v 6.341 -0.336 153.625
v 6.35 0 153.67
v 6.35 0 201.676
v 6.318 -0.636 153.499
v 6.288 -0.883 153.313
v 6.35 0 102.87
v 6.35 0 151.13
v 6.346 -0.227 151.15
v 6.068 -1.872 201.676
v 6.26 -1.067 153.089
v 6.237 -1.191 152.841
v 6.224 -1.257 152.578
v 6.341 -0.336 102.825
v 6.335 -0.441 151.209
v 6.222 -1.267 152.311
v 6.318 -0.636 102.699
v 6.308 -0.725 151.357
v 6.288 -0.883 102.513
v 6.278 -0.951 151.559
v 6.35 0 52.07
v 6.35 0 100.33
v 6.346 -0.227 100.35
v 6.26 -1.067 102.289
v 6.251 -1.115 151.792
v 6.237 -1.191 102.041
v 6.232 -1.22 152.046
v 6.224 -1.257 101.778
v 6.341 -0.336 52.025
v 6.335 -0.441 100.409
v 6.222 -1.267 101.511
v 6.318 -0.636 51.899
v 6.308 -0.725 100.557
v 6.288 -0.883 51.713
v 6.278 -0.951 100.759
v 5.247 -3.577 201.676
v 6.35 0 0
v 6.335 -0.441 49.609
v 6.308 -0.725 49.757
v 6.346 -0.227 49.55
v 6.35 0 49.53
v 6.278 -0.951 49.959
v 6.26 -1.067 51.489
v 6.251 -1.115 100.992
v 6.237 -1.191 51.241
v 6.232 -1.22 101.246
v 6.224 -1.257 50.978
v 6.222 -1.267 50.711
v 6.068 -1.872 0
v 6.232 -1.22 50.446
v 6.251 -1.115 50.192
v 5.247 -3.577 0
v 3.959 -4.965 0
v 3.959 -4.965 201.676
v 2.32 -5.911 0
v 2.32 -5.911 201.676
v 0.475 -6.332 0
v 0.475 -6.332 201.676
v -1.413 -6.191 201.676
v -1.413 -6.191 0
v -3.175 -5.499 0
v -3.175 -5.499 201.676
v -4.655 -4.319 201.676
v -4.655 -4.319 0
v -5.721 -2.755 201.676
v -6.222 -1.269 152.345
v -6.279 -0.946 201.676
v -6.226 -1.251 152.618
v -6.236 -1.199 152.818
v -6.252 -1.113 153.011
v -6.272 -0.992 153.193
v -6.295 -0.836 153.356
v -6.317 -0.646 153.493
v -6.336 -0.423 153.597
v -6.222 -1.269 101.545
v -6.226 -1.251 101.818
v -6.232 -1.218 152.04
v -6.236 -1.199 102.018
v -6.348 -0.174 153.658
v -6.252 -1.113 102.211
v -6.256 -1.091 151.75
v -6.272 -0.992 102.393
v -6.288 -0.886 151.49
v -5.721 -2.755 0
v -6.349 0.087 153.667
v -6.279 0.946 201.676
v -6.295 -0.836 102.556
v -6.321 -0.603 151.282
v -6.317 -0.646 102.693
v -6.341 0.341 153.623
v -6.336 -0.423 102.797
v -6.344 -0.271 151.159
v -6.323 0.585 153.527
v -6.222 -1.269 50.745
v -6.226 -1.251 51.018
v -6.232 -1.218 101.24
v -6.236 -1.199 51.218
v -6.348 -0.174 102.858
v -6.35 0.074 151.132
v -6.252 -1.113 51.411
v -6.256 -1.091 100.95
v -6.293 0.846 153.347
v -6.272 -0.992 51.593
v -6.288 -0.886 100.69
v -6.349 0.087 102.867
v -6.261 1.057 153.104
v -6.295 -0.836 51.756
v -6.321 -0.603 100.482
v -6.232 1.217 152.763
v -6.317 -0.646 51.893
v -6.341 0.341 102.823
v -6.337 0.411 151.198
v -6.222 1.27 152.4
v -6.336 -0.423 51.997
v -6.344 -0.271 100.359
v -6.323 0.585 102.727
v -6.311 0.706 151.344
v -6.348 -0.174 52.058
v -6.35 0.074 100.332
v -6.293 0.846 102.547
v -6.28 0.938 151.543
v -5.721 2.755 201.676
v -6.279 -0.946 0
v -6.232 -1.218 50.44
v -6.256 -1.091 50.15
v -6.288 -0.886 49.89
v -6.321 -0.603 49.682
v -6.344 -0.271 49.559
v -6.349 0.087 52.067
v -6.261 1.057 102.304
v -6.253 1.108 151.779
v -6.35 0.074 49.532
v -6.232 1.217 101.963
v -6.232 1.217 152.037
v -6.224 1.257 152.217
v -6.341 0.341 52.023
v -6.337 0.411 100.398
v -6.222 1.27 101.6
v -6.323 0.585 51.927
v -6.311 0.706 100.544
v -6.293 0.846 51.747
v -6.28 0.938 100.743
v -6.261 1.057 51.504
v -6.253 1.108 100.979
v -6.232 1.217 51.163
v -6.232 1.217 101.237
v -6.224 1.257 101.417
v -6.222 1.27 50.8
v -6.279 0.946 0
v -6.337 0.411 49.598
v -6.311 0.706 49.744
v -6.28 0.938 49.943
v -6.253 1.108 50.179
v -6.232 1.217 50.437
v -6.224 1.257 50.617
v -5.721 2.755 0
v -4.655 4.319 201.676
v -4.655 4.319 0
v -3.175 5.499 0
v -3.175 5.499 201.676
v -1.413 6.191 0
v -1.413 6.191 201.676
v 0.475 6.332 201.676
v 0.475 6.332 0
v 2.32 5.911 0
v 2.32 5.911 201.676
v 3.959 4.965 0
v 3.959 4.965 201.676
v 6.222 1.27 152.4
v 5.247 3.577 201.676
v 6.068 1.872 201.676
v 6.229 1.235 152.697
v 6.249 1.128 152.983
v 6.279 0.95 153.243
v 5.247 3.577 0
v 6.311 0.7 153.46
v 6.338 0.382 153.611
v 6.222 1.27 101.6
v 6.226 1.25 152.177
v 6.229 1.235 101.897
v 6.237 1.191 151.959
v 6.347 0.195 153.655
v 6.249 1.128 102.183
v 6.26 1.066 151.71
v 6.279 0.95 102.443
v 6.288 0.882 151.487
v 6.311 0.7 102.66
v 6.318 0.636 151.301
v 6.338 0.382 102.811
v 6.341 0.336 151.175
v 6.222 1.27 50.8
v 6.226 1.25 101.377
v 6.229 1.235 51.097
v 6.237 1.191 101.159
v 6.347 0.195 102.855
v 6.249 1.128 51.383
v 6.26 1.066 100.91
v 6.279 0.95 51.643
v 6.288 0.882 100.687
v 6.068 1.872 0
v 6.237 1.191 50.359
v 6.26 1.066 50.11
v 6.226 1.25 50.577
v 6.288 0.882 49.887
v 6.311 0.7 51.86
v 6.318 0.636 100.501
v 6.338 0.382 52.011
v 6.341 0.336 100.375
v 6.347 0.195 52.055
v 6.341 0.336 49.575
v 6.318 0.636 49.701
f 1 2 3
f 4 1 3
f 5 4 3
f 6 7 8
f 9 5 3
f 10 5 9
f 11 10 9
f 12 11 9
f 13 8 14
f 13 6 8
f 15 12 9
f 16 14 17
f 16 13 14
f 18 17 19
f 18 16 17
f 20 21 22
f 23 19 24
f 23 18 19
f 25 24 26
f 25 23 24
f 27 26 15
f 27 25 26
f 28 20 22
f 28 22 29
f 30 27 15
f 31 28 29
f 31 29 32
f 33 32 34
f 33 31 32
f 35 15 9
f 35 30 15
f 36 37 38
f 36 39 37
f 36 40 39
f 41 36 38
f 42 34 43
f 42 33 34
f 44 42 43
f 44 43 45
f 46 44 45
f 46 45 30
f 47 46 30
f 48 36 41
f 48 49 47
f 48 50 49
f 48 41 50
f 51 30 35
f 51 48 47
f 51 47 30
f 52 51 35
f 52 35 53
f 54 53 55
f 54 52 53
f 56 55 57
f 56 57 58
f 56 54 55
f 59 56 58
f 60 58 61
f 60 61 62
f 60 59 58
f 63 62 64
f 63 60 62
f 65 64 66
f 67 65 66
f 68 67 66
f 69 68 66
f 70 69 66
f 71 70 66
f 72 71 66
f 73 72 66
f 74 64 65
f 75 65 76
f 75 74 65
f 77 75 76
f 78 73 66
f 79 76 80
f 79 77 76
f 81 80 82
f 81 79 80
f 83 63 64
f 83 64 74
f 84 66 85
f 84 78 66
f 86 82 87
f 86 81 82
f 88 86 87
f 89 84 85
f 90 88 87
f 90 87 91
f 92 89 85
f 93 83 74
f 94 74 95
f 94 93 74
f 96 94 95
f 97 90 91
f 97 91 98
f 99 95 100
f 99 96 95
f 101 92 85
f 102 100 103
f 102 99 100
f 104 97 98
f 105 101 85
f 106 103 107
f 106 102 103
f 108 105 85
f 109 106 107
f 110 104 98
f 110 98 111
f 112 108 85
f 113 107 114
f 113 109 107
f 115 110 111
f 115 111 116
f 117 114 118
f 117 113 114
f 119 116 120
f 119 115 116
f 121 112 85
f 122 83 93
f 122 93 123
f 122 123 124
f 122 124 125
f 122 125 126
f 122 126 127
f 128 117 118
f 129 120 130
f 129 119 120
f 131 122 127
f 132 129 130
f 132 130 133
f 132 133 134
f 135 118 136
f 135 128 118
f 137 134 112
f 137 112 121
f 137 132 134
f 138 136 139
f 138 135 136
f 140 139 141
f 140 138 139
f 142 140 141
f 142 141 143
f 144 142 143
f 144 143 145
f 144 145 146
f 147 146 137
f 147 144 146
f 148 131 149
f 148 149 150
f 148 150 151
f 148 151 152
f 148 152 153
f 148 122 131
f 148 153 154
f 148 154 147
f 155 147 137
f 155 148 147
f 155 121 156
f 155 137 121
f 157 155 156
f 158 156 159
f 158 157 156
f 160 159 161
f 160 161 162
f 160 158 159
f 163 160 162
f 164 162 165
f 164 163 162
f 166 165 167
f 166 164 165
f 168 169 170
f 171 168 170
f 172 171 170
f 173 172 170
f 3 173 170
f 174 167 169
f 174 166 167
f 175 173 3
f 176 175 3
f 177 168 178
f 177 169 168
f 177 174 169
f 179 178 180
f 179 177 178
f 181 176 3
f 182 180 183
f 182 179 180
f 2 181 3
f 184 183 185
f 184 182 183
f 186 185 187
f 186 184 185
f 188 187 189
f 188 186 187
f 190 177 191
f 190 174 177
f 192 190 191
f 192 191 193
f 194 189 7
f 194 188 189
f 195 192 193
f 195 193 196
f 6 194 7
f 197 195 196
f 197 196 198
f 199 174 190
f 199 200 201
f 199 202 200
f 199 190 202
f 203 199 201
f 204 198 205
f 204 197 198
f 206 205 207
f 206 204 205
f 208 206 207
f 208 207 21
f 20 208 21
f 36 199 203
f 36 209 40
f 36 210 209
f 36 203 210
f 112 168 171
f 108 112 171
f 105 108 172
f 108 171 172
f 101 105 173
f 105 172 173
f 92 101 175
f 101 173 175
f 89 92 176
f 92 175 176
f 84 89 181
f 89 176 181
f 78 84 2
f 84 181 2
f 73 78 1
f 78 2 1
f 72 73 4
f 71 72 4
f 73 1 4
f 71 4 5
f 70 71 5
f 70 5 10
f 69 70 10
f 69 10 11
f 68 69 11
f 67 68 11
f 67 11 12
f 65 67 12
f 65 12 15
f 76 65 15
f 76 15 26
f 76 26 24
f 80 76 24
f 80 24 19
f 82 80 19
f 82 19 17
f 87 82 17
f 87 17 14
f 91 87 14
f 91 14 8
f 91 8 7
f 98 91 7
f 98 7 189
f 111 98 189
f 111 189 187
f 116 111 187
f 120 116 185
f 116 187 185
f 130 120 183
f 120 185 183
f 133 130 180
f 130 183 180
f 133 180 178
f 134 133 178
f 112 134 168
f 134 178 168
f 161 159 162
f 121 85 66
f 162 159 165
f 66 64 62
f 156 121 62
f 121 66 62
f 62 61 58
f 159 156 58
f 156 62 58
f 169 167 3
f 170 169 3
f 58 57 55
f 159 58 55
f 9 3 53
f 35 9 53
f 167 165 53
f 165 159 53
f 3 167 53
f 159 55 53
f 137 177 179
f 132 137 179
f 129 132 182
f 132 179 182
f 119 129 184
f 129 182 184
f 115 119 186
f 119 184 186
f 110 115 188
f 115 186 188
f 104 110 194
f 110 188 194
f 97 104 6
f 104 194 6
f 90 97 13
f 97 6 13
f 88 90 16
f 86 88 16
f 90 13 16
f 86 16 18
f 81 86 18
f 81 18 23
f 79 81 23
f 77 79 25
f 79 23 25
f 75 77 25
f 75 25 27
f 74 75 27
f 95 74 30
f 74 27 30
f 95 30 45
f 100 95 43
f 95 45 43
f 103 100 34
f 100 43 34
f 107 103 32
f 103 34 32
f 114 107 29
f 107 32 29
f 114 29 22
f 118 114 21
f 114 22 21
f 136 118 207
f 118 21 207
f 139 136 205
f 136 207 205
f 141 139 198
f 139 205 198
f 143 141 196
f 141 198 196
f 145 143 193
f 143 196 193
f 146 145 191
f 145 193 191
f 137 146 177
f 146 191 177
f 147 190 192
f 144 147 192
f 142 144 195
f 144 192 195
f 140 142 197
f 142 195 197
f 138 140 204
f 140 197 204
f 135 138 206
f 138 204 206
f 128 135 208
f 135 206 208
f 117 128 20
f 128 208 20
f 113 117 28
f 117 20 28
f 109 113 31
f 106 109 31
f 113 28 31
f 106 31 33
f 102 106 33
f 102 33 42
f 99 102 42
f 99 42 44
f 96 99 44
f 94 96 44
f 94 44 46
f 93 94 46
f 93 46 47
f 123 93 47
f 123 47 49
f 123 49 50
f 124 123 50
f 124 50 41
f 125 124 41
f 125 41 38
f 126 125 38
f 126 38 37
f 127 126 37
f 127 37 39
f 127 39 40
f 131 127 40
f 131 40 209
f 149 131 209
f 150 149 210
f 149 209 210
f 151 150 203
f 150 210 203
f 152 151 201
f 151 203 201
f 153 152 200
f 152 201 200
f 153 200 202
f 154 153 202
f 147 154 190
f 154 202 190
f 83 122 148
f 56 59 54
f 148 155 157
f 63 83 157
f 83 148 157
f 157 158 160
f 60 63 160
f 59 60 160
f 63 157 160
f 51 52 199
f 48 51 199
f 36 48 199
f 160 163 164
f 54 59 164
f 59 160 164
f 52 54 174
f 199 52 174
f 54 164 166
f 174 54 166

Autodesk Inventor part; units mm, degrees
ref_plane "YZ Plane" through (0, 0, 0) normal (1, 0, 0) x (0, 1, 0)
ref_plane "XZ Plane" through (0, 0, 0) normal (0, 1, 0) x (-1, 0, 0)
ref_plane "XY Plane" through (0, 0, 0) normal (0, 0, 1) x (1, 0, 0)
sketch "Sketch1" plane through (0, 0, 0) normal (0, 0, 1) x (1, 0, 0)
  circle A0 centre (0, 0) radius 6.35
  dimension "d0" = 12.7
extrude "Extrusion1" add sketch "Sketch1" along normal blind 203.2
sketch "Sketch5" plane through (0, 0, 0) normal (0, 1, 0) x (-1, 0, 0)
  line L0 (0, 1.524) -> (-1.27, 1.524)
  line L1 (-6.35, 0) -> (6.35, 0) projected
  line L2 (-1.27, 0) -> (1.27, 0)
  line L3 (1.27, 1.524) -> (0, 1.524)
  line L4 (1.27, 1.524) -> (6.35, 1.524)
  line L5 (6.35, 0) -> (6.35, 203.2) projected
  line L6 (6.35, 1.524) -> (-6.35, 1.524)
  line L7 (-6.35, 1.524) -> (-6.35, 0)
  line L8 (-6.35, 0) -> (6.35, 0)
  line L9 (6.35, 0) -> (6.35, 1.524)
  line L10 (6.35, 203.2) -> (-6.35, 203.2) projected
  line L11 (-6.35, 203.2) -> (6.35, 203.2)
  line L12 (6.35, 203.2) -> (6.35, 201.676)
  line L13 (6.35, 201.676) -> (-6.35, 201.676)
  line L14 (-6.35, 201.676) -> (-6.35, 203.2)
  point P0 (0, 0)
  dimension "d20" = 1.524
  dimension "d21" = 1.27
  dimension "d26" = 12.7
  dimension "d27" = 1.524
sketch "Sketch7" plane through (0, 0, 0) normal (1, 0, 0) x (0, 1, 0)
  line L0 (0, 0) -> (0, 50.8)
  circle A0 centre (0, 50.8) radius 1.27
  line L1 (0, 50.8) -> (0, 101.6)
  circle A1 centre (0, 101.6) radius 1.27
  line L2 (0, 101.6) -> (0, 152.4)
  circle A2 centre (0, 152.4) radius 1.27
  dimension "d42" = 50.8
  dimension "d43" = 2.54
  dimension "d44" = 50.8
  dimension "d45" = 2.54
  dimension "d46" = 50.8
  dimension "d47" = 2.54
extrude "Extrusion8" cut sketch "Sketch7" along normal mid plane 25.4
extrude "Extrusion9" cut sketch "Sketch5" along normal mid plane 25.4 contours L13 L14 L10 L5
properties part number "Straw"
